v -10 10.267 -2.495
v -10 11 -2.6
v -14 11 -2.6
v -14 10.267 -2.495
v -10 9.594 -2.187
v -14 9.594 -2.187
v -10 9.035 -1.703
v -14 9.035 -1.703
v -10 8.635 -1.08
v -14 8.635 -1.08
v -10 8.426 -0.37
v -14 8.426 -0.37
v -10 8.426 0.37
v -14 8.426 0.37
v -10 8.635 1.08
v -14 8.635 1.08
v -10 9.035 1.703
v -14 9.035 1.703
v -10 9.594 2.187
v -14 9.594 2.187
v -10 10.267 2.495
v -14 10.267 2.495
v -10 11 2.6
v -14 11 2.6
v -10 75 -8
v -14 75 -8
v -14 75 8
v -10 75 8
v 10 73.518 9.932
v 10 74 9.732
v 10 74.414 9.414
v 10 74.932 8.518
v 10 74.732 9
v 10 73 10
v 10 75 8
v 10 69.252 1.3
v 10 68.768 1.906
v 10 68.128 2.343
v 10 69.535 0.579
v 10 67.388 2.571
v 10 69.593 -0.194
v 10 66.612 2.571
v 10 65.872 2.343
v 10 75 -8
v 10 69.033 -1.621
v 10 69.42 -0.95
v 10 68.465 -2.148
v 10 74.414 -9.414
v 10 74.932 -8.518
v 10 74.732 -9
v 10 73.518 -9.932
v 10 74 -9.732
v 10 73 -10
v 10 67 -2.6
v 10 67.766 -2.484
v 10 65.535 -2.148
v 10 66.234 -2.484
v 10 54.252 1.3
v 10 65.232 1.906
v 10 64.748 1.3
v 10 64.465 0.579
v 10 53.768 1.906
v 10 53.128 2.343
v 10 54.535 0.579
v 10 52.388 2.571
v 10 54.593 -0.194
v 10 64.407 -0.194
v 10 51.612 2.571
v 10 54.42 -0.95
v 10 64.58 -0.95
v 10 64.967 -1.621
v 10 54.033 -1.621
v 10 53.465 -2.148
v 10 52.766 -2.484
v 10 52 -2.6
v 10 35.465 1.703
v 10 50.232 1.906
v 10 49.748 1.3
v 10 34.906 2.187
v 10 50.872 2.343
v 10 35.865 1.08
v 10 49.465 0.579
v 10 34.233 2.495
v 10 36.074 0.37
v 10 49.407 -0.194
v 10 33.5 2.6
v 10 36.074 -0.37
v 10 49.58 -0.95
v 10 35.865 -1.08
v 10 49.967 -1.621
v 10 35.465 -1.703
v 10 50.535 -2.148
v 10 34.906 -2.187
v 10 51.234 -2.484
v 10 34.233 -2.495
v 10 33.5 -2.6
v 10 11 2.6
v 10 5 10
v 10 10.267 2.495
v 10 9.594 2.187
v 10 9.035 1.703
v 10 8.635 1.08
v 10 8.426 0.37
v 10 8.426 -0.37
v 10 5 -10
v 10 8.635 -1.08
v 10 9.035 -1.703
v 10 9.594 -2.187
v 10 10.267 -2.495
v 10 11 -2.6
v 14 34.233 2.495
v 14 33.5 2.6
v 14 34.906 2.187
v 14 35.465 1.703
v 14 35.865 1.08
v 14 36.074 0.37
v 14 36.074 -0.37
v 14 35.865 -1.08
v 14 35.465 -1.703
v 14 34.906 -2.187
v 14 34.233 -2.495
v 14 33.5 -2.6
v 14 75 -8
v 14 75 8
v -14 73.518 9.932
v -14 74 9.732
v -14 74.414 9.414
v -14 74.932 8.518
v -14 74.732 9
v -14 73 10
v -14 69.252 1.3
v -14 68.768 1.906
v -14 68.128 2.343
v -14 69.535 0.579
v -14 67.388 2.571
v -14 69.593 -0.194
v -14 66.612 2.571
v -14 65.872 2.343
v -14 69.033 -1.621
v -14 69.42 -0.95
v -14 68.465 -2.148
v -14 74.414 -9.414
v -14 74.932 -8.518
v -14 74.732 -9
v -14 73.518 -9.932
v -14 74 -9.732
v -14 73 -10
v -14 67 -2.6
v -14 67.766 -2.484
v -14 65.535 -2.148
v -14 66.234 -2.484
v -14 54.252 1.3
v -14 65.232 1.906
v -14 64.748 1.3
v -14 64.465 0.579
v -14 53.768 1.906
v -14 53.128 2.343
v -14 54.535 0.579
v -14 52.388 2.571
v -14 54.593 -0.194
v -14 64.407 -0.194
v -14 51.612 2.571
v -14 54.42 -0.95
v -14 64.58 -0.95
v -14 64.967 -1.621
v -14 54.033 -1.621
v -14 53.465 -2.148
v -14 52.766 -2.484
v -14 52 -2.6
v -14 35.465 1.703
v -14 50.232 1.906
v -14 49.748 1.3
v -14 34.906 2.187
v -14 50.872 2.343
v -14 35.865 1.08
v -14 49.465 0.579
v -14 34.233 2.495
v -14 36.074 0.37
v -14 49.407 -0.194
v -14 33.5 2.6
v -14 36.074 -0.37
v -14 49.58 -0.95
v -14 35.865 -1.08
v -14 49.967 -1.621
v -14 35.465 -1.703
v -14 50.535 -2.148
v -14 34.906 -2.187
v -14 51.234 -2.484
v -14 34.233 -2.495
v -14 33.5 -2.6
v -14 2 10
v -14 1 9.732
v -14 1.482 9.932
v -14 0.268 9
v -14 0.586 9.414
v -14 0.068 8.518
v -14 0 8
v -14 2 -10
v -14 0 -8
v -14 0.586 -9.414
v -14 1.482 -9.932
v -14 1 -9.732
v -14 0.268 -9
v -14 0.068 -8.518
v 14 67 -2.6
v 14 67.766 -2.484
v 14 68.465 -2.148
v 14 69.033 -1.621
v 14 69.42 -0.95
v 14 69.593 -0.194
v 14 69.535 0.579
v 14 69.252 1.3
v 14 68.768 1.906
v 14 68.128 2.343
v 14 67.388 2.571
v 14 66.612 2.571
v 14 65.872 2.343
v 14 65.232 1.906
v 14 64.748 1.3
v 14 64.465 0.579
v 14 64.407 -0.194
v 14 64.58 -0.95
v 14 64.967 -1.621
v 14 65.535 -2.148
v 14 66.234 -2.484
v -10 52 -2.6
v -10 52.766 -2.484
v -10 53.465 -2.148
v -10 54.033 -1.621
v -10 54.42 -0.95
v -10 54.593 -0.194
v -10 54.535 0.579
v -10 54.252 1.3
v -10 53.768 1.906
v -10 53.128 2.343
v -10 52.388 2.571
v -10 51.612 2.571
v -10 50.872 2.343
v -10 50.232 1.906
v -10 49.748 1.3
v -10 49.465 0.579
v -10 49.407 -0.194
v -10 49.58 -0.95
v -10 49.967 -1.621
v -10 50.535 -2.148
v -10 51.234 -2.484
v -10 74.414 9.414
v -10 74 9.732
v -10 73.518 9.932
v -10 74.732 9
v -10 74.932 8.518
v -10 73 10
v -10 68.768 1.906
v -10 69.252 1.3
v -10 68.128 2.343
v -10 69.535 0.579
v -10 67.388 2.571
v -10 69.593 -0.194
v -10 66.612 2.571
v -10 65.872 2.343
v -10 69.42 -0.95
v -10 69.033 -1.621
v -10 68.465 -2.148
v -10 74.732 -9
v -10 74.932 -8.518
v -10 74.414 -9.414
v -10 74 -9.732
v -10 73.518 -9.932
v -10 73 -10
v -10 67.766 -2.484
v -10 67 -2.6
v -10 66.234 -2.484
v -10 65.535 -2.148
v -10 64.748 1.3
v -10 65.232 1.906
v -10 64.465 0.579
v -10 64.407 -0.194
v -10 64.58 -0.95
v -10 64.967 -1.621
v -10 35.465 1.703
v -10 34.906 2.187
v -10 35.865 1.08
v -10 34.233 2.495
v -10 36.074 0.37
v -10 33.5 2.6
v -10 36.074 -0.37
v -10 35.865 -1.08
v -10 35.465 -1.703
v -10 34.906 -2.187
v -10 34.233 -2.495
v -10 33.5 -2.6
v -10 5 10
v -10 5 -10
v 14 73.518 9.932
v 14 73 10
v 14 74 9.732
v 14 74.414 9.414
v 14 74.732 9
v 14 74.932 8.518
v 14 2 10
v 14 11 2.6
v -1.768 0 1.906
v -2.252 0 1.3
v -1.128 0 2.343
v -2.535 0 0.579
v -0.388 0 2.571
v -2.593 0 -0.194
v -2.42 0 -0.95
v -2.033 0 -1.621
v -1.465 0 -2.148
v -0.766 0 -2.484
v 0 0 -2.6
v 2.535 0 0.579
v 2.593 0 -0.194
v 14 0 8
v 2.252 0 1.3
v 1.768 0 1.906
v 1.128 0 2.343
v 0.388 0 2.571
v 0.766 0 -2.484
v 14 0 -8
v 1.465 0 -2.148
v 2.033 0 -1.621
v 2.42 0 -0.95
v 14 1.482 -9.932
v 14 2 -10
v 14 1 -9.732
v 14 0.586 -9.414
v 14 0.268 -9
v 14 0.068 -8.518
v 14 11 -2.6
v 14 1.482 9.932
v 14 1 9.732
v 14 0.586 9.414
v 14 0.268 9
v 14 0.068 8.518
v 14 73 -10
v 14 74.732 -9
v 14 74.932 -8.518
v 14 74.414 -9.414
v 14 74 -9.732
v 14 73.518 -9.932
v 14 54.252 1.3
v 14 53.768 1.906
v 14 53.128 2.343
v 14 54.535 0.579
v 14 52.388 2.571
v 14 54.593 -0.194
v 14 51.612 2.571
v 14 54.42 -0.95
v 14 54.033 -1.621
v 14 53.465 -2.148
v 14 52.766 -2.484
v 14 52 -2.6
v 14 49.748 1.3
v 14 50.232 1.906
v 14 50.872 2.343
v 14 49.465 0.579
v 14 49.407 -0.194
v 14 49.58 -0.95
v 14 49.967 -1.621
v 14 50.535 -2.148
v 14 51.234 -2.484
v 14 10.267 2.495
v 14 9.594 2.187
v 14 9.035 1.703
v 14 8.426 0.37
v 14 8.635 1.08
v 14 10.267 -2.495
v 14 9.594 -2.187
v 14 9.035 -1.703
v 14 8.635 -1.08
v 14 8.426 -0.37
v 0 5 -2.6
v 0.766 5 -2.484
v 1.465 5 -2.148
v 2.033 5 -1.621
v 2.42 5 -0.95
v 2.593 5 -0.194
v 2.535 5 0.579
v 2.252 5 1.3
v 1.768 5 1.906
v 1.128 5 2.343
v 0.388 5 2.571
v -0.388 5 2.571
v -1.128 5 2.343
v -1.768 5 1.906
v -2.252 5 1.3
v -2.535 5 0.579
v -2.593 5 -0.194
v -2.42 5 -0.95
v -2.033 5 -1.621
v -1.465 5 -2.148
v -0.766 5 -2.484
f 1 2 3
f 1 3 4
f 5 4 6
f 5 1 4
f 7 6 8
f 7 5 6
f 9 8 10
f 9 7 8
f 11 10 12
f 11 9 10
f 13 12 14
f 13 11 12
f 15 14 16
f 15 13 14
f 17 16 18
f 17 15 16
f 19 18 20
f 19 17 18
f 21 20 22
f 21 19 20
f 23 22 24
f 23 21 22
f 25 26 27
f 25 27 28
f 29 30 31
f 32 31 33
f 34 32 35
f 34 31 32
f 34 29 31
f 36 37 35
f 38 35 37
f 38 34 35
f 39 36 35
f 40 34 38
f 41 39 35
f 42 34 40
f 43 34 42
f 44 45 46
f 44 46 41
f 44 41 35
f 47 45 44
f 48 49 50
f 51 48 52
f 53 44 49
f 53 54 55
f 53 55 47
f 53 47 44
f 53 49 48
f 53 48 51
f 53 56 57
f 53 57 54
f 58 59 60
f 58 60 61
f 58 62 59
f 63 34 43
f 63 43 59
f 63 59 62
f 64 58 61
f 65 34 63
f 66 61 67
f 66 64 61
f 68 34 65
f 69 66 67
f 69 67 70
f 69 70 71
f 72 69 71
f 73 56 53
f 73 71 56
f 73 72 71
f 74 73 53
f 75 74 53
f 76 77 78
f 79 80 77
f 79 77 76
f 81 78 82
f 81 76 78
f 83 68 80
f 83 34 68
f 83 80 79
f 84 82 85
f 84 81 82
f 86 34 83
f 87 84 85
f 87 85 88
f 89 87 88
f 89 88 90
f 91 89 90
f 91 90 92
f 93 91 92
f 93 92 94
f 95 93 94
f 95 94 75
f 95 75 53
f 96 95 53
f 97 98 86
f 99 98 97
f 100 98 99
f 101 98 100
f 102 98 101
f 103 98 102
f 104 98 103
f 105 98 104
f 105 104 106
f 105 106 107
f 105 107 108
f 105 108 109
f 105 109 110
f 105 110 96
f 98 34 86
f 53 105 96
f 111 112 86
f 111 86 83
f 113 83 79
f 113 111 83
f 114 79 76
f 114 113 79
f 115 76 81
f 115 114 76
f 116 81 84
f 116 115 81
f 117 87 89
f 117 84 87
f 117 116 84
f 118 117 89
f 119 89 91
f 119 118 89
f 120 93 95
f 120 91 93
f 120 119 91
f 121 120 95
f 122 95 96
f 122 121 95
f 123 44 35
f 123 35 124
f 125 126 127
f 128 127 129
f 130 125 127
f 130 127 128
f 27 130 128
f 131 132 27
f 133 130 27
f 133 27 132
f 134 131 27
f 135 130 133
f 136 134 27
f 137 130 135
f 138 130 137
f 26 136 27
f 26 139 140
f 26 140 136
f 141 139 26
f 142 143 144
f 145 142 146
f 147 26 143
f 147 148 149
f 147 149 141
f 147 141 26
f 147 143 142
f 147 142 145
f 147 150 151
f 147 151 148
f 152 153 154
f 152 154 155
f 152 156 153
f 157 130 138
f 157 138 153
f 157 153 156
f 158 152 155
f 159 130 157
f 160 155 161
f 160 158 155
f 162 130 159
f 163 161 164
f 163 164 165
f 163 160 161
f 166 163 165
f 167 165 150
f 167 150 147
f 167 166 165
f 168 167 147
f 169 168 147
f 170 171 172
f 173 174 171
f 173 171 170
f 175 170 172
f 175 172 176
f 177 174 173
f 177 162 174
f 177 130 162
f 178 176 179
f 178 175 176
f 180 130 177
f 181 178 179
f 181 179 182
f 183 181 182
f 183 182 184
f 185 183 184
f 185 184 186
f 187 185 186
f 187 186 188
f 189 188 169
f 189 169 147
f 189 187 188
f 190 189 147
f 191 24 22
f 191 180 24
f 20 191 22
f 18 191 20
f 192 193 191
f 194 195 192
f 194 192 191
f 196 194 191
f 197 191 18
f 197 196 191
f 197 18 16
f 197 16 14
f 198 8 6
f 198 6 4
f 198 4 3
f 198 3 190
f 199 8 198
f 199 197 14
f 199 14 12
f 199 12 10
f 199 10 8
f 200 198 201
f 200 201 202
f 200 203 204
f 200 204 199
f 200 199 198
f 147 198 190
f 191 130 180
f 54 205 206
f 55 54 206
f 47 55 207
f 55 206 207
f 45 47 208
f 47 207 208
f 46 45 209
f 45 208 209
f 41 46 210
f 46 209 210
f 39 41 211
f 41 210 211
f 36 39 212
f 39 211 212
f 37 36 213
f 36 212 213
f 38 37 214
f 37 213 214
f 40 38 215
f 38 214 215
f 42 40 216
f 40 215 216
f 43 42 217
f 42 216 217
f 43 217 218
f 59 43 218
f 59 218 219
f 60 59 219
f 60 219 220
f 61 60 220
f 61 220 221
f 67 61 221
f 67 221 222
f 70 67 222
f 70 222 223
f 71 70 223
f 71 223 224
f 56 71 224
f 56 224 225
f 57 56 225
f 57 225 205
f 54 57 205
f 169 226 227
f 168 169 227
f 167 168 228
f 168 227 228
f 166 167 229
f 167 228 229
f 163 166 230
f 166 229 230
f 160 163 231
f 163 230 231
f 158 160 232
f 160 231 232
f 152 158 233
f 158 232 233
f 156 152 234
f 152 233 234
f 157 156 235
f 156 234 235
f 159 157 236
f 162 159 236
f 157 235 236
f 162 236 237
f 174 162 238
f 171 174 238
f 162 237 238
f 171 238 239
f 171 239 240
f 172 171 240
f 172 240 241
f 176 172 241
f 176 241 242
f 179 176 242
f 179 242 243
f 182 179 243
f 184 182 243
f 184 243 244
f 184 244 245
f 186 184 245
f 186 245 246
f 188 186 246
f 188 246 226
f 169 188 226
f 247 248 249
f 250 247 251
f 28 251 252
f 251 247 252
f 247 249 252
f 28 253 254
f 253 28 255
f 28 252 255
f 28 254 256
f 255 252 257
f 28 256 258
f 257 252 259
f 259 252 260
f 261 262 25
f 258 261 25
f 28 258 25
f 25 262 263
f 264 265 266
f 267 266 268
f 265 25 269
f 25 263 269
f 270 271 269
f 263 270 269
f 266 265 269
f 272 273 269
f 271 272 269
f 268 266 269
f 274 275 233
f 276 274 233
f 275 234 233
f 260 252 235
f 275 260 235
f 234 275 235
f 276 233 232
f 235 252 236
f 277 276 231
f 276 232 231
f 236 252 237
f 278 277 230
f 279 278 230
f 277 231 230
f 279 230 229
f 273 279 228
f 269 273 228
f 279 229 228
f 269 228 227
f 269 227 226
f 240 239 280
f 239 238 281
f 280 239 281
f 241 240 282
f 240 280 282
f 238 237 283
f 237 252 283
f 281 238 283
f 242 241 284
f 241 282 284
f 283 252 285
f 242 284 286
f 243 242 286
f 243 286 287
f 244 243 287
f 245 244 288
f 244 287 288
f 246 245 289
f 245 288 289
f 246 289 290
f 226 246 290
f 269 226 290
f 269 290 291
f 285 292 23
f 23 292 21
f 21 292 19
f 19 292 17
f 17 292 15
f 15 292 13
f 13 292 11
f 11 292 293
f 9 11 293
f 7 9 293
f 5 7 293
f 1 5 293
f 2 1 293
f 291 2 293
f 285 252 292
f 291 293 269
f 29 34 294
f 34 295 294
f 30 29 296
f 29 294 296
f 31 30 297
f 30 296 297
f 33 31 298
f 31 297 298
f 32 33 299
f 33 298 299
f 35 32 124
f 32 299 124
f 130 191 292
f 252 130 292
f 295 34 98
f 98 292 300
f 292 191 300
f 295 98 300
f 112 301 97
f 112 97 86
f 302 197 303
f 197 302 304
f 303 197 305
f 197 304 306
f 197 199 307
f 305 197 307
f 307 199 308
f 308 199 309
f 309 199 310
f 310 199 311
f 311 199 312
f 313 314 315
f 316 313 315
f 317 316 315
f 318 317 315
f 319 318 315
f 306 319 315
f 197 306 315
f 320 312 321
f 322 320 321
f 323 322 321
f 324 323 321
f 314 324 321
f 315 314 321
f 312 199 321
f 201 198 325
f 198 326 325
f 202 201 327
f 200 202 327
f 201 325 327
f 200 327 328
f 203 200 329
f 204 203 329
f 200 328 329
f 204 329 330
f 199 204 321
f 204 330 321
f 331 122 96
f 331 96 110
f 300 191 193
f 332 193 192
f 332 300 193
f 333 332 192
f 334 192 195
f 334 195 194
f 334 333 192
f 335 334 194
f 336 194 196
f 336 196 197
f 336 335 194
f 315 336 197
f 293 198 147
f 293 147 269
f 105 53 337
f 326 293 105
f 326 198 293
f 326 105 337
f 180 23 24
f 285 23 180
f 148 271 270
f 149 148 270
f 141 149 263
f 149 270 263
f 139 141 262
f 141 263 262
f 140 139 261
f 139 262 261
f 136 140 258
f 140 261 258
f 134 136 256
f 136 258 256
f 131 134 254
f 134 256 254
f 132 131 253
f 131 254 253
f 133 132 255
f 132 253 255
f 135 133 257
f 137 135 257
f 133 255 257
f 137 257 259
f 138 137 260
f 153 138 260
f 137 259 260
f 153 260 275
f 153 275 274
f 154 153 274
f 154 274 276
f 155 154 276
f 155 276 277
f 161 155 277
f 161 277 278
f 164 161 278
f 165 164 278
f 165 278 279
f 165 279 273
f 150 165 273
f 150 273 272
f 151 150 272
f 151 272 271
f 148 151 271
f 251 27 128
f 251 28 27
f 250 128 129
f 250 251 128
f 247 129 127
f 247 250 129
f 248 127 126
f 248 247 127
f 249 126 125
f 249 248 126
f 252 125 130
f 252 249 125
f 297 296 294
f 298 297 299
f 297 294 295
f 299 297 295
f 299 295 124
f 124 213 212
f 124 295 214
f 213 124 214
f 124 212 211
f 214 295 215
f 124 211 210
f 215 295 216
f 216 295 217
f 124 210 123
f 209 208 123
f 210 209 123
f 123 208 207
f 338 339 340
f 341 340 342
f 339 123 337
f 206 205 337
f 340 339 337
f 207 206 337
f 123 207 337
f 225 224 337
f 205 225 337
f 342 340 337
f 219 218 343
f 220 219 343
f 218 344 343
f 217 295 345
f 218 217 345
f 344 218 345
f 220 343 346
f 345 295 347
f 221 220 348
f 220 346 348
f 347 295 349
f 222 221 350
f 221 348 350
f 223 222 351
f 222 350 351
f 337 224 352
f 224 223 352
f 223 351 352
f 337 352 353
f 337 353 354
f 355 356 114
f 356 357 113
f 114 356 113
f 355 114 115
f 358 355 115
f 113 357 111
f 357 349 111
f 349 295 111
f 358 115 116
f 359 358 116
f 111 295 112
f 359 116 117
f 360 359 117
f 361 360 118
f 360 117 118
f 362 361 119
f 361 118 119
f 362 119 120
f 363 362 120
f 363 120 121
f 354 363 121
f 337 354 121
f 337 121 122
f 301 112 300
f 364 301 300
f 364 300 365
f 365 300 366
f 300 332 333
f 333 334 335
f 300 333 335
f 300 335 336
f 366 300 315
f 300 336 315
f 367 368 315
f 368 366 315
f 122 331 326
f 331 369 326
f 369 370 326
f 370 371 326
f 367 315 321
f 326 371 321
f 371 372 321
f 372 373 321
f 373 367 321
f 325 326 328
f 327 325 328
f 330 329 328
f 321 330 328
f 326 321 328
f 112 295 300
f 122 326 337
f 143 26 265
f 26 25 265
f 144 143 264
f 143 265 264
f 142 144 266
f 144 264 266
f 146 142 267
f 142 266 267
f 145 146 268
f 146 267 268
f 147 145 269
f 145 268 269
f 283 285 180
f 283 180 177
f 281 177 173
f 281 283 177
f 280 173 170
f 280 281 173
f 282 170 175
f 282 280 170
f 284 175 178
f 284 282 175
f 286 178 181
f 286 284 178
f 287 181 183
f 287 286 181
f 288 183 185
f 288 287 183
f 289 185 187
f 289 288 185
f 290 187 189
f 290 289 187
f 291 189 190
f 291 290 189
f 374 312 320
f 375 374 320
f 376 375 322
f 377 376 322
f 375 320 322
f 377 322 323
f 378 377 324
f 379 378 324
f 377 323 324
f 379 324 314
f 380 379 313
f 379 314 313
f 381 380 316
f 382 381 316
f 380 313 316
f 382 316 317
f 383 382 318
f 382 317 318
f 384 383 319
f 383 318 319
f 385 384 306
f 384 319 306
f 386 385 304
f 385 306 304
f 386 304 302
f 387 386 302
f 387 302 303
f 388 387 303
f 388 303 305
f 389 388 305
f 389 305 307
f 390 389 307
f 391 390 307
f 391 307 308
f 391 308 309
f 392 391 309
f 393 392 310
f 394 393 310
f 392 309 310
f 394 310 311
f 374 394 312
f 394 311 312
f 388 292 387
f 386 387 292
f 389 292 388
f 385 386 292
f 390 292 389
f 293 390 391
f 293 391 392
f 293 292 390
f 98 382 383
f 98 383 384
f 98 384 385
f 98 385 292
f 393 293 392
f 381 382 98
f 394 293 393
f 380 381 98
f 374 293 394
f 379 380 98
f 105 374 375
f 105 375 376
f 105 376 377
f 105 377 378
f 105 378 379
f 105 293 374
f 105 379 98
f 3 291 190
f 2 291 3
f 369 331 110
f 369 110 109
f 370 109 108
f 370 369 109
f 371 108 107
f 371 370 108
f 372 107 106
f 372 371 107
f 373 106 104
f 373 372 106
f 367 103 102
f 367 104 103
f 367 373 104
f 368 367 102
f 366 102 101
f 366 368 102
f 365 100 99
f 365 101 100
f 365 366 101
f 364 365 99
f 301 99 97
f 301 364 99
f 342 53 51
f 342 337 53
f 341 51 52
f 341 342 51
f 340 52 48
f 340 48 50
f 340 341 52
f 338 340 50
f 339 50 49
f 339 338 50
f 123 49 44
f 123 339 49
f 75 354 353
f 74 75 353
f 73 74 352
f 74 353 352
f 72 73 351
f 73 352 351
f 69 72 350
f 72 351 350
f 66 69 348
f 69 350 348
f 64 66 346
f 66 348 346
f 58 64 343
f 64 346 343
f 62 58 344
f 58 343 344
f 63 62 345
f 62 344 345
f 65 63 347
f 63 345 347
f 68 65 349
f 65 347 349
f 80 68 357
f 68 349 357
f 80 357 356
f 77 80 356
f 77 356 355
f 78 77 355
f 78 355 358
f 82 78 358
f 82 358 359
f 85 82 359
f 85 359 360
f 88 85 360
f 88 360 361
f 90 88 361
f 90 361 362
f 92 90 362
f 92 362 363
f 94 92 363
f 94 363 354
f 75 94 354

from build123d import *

# Parameters (mm, degrees)
SKETCH1_W           = 28
SKETCH1_H           = 20
BOSS_EXTRUDE1_DEPTH = 5
SKETCH2_W           = 4
SKETCH2_H           = 20
BOSS_EXTRUDE2_DEPTH = 70
SKETCH3_R           = 2.6
CUT_EXTRUDE1_DEPTH  = 5
SKETCH4_R           = 2.6
CUT_EXTRUDE2_DEPTH  = 40
FILLET1_R           = 2


with BuildPart() as part:
    # Sketch1 → Boss-Extrude1 (new body)
    with BuildSketch(Plane(origin=(0, 0, 0), x_dir=(1, 0, 0), z_dir=(0, 1, 0))):
        Rectangle(SKETCH1_W, SKETCH1_H)
    extrude(amount=BOSS_EXTRUDE1_DEPTH)

    # Sketch2 → Boss-Extrude2 (add)
    with BuildSketch(Plane(origin=(0, 5, 0), x_dir=(1, 0, 0), z_dir=(0, 1, 0))):
        with Locations((-12, 0)):
            Rectangle(SKETCH2_W, SKETCH2_H)
        with Locations((12, 0)):
            Rectangle(SKETCH2_W, SKETCH2_H)
    extrude(amount=BOSS_EXTRUDE2_DEPTH)

    # Sketch3 → Cut-Extrude1 (cut)
    with BuildSketch(Plane.XZ):
        with Locations(Location((0, 0, 0), (0, 0, 270))):
            Circle(SKETCH3_R)
    extrude(amount=-CUT_EXTRUDE1_DEPTH, mode=Mode.SUBTRACT)

    # Sketch4 → Cut-Extrude2 (cut)
    with BuildSketch(Plane(origin=(14, 0, 0), x_dir=(0, 0, -1), z_dir=(1, 0, 0))):
        with Locations((0, 67)):
            Circle(SKETCH4_R)
        with Locations((0, 52)):
            Circle(SKETCH4_R)
        with BuildLine():
            Line((2.6, 33.5), (2.6, 11))
            ThreePointArc((2.6, 11), (0, 8.4), (-2.6, 11))
            Line((-2.6, 11), (-2.6, 33.5))
            ThreePointArc((-2.6, 33.5), (0, 36.1), (2.6, 33.5))
        make_face()
    extrude(amount=-CUT_EXTRUDE2_DEPTH, mode=Mode.SUBTRACT)

    # Fillet1
    fillet1_edges = [part.edges().sort_by_distance(p)[0] for p in [
        (-12, 75, 10),
        (-12, 75, -10),
        (12, 75, -10),
        (12, 75, 10),
        (0, 0, 10),
        (0, 0, -10),
    ]]
    fillet(fillet1_edges, radius=FILLET1_R)


solid = part.part
